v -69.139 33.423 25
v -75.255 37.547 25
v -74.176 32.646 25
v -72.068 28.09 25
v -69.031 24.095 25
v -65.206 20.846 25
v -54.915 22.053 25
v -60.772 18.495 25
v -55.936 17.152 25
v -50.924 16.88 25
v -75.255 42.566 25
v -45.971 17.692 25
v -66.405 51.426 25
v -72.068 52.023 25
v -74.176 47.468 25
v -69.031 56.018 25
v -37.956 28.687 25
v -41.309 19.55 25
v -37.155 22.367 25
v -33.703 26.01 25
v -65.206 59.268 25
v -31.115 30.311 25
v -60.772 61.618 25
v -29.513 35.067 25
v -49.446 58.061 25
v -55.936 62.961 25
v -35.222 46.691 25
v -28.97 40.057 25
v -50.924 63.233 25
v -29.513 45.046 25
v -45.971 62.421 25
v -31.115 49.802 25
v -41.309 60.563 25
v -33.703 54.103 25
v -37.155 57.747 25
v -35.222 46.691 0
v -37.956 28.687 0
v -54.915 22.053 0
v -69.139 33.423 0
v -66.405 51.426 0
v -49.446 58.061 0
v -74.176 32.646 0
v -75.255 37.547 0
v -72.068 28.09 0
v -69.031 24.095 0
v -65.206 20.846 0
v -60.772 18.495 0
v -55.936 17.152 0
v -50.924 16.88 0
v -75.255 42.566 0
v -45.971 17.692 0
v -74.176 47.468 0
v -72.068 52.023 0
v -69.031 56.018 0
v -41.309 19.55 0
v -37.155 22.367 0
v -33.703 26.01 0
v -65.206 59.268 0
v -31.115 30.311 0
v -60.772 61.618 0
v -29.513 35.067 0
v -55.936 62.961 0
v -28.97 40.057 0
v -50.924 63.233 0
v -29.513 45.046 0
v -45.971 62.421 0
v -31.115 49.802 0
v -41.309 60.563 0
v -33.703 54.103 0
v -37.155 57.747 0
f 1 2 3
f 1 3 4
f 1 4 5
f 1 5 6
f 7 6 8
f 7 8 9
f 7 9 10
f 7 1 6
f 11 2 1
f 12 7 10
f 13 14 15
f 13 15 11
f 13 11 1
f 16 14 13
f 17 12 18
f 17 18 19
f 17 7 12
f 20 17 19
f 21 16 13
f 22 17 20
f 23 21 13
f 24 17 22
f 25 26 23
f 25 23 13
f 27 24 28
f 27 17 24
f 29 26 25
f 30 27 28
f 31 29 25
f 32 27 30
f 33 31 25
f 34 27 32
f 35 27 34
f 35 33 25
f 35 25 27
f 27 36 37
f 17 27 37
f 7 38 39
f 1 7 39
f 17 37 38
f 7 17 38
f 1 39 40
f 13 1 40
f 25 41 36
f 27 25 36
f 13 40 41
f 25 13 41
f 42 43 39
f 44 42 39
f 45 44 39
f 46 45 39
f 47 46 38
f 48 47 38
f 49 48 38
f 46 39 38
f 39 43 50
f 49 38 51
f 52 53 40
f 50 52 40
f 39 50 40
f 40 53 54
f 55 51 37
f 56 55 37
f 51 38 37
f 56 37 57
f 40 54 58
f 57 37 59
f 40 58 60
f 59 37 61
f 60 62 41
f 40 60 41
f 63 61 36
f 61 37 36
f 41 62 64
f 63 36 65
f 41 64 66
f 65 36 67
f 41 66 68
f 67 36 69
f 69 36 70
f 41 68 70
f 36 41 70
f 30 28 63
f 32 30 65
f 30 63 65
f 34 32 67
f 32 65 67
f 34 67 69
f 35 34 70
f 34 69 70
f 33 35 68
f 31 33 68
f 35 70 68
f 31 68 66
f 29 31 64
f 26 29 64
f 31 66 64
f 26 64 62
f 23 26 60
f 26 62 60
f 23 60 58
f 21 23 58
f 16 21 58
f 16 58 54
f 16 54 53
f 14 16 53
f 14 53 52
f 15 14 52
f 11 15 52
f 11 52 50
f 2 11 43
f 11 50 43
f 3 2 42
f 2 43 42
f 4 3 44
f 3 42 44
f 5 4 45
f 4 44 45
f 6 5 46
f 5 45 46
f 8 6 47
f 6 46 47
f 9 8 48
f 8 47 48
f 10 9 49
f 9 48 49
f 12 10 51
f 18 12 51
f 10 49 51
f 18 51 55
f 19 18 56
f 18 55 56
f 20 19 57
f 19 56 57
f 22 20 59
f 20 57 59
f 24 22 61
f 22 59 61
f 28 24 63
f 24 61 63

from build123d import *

# Parameters (mm, degrees)
F0_R     = 23.2102979376
F1_DEPTH = 25


with BuildPart() as f1:
    # F0 (on Top) → F1 (new body)
    with BuildSketch(Plane.XY):
        with Locations((-52.1805621684, 40.0566533208)):
            Circle(F0_R)
        with BuildLine():
            ThreePointArc((-35.2217002906, 46.6907966038), (-34.2858599457, 43.4322252204), (-33.970266913, 40.0566533208))
            ThreePointArc((-33.970266913, 40.0566533208), (-34.9955095005, 34.0326332268), (-37.9557946141, 28.6869197569))
            ThreePointArc((-37.9557946141, 28.6869197569), (-45.5464188854, 23.097791443), (-54.9146564918, 22.0527764739))
            ThreePointArc((-54.9146564918, 22.0527764739), (-63.5502957323, 25.8318857665), (-69.1394240461, 33.4225100378))
            ThreePointArc((-69.1394240461, 33.4225100378), (-70.1844390153, 42.7907476443), (-66.4053297227, 51.4263868847))
            ThreePointArc((-66.4053297227, 51.4263868847), (-58.8147054513, 57.0155151985), (-49.4464678449, 58.0605301677))
            ThreePointArc((-49.4464678449, 58.0605301677), (-40.8108286044, 54.2814208751), (-35.2217002906, 46.6907966038))
        make_face(mode=Mode.SUBTRACT)
        with BuildLine():
            Line((-49.4464678449, 58.0605301677), (-35.2217002906, 46.6907966038))
            ThreePointArc((-35.2217002906, 46.6907966038), (-40.8108286044, 54.2814208751), (-49.4464678449, 58.0605301677))
        make_face()
        with BuildLine():
            Line((-66.4053297227, 51.4263868847), (-49.4464678449, 58.0605301677))
            ThreePointArc((-49.4464678449, 58.0605301677), (-58.8147054513, 57.0155151985), (-66.4053297227, 51.4263868847))
        make_face()
        with BuildLine():
            ThreePointArc((-37.9557946141, 28.6869197569), (-34.9955095005, 34.0326332268), (-33.970266913, 40.0566533208))
            ThreePointArc((-33.970266913, 40.0566533208), (-34.2858599457, 43.4322252204), (-35.2217002906, 46.6907966038))
            Line((-35.2217002906, 46.6907966038), (-37.9557946141, 28.6869197569))
        make_face()
        with BuildLine():
            ThreePointArc((-54.9146564918, 22.0527764739), (-45.5464188854, 23.097791443), (-37.9557946141, 28.6869197569))
            Line((-37.9557946141, 28.6869197569), (-54.9146564918, 22.0527764739))
        make_face()
        with BuildLine():
            Line((-69.1394240461, 33.4225100378), (-66.4053297227, 51.4263868847))
            ThreePointArc((-66.4053297227, 51.4263868847), (-70.1844390153, 42.7907476443), (-69.1394240461, 33.4225100378))
        make_face()
        with BuildLine():
            ThreePointArc((-69.1394240461, 33.4225100378), (-63.5502957323, 25.8318857665), (-54.9146564918, 22.0527764739))
            Line((-54.9146564918, 22.0527764739), (-69.1394240461, 33.4225100378))
        make_face()
    extrude(amount=F1_DEPTH)


solid = f1.part
